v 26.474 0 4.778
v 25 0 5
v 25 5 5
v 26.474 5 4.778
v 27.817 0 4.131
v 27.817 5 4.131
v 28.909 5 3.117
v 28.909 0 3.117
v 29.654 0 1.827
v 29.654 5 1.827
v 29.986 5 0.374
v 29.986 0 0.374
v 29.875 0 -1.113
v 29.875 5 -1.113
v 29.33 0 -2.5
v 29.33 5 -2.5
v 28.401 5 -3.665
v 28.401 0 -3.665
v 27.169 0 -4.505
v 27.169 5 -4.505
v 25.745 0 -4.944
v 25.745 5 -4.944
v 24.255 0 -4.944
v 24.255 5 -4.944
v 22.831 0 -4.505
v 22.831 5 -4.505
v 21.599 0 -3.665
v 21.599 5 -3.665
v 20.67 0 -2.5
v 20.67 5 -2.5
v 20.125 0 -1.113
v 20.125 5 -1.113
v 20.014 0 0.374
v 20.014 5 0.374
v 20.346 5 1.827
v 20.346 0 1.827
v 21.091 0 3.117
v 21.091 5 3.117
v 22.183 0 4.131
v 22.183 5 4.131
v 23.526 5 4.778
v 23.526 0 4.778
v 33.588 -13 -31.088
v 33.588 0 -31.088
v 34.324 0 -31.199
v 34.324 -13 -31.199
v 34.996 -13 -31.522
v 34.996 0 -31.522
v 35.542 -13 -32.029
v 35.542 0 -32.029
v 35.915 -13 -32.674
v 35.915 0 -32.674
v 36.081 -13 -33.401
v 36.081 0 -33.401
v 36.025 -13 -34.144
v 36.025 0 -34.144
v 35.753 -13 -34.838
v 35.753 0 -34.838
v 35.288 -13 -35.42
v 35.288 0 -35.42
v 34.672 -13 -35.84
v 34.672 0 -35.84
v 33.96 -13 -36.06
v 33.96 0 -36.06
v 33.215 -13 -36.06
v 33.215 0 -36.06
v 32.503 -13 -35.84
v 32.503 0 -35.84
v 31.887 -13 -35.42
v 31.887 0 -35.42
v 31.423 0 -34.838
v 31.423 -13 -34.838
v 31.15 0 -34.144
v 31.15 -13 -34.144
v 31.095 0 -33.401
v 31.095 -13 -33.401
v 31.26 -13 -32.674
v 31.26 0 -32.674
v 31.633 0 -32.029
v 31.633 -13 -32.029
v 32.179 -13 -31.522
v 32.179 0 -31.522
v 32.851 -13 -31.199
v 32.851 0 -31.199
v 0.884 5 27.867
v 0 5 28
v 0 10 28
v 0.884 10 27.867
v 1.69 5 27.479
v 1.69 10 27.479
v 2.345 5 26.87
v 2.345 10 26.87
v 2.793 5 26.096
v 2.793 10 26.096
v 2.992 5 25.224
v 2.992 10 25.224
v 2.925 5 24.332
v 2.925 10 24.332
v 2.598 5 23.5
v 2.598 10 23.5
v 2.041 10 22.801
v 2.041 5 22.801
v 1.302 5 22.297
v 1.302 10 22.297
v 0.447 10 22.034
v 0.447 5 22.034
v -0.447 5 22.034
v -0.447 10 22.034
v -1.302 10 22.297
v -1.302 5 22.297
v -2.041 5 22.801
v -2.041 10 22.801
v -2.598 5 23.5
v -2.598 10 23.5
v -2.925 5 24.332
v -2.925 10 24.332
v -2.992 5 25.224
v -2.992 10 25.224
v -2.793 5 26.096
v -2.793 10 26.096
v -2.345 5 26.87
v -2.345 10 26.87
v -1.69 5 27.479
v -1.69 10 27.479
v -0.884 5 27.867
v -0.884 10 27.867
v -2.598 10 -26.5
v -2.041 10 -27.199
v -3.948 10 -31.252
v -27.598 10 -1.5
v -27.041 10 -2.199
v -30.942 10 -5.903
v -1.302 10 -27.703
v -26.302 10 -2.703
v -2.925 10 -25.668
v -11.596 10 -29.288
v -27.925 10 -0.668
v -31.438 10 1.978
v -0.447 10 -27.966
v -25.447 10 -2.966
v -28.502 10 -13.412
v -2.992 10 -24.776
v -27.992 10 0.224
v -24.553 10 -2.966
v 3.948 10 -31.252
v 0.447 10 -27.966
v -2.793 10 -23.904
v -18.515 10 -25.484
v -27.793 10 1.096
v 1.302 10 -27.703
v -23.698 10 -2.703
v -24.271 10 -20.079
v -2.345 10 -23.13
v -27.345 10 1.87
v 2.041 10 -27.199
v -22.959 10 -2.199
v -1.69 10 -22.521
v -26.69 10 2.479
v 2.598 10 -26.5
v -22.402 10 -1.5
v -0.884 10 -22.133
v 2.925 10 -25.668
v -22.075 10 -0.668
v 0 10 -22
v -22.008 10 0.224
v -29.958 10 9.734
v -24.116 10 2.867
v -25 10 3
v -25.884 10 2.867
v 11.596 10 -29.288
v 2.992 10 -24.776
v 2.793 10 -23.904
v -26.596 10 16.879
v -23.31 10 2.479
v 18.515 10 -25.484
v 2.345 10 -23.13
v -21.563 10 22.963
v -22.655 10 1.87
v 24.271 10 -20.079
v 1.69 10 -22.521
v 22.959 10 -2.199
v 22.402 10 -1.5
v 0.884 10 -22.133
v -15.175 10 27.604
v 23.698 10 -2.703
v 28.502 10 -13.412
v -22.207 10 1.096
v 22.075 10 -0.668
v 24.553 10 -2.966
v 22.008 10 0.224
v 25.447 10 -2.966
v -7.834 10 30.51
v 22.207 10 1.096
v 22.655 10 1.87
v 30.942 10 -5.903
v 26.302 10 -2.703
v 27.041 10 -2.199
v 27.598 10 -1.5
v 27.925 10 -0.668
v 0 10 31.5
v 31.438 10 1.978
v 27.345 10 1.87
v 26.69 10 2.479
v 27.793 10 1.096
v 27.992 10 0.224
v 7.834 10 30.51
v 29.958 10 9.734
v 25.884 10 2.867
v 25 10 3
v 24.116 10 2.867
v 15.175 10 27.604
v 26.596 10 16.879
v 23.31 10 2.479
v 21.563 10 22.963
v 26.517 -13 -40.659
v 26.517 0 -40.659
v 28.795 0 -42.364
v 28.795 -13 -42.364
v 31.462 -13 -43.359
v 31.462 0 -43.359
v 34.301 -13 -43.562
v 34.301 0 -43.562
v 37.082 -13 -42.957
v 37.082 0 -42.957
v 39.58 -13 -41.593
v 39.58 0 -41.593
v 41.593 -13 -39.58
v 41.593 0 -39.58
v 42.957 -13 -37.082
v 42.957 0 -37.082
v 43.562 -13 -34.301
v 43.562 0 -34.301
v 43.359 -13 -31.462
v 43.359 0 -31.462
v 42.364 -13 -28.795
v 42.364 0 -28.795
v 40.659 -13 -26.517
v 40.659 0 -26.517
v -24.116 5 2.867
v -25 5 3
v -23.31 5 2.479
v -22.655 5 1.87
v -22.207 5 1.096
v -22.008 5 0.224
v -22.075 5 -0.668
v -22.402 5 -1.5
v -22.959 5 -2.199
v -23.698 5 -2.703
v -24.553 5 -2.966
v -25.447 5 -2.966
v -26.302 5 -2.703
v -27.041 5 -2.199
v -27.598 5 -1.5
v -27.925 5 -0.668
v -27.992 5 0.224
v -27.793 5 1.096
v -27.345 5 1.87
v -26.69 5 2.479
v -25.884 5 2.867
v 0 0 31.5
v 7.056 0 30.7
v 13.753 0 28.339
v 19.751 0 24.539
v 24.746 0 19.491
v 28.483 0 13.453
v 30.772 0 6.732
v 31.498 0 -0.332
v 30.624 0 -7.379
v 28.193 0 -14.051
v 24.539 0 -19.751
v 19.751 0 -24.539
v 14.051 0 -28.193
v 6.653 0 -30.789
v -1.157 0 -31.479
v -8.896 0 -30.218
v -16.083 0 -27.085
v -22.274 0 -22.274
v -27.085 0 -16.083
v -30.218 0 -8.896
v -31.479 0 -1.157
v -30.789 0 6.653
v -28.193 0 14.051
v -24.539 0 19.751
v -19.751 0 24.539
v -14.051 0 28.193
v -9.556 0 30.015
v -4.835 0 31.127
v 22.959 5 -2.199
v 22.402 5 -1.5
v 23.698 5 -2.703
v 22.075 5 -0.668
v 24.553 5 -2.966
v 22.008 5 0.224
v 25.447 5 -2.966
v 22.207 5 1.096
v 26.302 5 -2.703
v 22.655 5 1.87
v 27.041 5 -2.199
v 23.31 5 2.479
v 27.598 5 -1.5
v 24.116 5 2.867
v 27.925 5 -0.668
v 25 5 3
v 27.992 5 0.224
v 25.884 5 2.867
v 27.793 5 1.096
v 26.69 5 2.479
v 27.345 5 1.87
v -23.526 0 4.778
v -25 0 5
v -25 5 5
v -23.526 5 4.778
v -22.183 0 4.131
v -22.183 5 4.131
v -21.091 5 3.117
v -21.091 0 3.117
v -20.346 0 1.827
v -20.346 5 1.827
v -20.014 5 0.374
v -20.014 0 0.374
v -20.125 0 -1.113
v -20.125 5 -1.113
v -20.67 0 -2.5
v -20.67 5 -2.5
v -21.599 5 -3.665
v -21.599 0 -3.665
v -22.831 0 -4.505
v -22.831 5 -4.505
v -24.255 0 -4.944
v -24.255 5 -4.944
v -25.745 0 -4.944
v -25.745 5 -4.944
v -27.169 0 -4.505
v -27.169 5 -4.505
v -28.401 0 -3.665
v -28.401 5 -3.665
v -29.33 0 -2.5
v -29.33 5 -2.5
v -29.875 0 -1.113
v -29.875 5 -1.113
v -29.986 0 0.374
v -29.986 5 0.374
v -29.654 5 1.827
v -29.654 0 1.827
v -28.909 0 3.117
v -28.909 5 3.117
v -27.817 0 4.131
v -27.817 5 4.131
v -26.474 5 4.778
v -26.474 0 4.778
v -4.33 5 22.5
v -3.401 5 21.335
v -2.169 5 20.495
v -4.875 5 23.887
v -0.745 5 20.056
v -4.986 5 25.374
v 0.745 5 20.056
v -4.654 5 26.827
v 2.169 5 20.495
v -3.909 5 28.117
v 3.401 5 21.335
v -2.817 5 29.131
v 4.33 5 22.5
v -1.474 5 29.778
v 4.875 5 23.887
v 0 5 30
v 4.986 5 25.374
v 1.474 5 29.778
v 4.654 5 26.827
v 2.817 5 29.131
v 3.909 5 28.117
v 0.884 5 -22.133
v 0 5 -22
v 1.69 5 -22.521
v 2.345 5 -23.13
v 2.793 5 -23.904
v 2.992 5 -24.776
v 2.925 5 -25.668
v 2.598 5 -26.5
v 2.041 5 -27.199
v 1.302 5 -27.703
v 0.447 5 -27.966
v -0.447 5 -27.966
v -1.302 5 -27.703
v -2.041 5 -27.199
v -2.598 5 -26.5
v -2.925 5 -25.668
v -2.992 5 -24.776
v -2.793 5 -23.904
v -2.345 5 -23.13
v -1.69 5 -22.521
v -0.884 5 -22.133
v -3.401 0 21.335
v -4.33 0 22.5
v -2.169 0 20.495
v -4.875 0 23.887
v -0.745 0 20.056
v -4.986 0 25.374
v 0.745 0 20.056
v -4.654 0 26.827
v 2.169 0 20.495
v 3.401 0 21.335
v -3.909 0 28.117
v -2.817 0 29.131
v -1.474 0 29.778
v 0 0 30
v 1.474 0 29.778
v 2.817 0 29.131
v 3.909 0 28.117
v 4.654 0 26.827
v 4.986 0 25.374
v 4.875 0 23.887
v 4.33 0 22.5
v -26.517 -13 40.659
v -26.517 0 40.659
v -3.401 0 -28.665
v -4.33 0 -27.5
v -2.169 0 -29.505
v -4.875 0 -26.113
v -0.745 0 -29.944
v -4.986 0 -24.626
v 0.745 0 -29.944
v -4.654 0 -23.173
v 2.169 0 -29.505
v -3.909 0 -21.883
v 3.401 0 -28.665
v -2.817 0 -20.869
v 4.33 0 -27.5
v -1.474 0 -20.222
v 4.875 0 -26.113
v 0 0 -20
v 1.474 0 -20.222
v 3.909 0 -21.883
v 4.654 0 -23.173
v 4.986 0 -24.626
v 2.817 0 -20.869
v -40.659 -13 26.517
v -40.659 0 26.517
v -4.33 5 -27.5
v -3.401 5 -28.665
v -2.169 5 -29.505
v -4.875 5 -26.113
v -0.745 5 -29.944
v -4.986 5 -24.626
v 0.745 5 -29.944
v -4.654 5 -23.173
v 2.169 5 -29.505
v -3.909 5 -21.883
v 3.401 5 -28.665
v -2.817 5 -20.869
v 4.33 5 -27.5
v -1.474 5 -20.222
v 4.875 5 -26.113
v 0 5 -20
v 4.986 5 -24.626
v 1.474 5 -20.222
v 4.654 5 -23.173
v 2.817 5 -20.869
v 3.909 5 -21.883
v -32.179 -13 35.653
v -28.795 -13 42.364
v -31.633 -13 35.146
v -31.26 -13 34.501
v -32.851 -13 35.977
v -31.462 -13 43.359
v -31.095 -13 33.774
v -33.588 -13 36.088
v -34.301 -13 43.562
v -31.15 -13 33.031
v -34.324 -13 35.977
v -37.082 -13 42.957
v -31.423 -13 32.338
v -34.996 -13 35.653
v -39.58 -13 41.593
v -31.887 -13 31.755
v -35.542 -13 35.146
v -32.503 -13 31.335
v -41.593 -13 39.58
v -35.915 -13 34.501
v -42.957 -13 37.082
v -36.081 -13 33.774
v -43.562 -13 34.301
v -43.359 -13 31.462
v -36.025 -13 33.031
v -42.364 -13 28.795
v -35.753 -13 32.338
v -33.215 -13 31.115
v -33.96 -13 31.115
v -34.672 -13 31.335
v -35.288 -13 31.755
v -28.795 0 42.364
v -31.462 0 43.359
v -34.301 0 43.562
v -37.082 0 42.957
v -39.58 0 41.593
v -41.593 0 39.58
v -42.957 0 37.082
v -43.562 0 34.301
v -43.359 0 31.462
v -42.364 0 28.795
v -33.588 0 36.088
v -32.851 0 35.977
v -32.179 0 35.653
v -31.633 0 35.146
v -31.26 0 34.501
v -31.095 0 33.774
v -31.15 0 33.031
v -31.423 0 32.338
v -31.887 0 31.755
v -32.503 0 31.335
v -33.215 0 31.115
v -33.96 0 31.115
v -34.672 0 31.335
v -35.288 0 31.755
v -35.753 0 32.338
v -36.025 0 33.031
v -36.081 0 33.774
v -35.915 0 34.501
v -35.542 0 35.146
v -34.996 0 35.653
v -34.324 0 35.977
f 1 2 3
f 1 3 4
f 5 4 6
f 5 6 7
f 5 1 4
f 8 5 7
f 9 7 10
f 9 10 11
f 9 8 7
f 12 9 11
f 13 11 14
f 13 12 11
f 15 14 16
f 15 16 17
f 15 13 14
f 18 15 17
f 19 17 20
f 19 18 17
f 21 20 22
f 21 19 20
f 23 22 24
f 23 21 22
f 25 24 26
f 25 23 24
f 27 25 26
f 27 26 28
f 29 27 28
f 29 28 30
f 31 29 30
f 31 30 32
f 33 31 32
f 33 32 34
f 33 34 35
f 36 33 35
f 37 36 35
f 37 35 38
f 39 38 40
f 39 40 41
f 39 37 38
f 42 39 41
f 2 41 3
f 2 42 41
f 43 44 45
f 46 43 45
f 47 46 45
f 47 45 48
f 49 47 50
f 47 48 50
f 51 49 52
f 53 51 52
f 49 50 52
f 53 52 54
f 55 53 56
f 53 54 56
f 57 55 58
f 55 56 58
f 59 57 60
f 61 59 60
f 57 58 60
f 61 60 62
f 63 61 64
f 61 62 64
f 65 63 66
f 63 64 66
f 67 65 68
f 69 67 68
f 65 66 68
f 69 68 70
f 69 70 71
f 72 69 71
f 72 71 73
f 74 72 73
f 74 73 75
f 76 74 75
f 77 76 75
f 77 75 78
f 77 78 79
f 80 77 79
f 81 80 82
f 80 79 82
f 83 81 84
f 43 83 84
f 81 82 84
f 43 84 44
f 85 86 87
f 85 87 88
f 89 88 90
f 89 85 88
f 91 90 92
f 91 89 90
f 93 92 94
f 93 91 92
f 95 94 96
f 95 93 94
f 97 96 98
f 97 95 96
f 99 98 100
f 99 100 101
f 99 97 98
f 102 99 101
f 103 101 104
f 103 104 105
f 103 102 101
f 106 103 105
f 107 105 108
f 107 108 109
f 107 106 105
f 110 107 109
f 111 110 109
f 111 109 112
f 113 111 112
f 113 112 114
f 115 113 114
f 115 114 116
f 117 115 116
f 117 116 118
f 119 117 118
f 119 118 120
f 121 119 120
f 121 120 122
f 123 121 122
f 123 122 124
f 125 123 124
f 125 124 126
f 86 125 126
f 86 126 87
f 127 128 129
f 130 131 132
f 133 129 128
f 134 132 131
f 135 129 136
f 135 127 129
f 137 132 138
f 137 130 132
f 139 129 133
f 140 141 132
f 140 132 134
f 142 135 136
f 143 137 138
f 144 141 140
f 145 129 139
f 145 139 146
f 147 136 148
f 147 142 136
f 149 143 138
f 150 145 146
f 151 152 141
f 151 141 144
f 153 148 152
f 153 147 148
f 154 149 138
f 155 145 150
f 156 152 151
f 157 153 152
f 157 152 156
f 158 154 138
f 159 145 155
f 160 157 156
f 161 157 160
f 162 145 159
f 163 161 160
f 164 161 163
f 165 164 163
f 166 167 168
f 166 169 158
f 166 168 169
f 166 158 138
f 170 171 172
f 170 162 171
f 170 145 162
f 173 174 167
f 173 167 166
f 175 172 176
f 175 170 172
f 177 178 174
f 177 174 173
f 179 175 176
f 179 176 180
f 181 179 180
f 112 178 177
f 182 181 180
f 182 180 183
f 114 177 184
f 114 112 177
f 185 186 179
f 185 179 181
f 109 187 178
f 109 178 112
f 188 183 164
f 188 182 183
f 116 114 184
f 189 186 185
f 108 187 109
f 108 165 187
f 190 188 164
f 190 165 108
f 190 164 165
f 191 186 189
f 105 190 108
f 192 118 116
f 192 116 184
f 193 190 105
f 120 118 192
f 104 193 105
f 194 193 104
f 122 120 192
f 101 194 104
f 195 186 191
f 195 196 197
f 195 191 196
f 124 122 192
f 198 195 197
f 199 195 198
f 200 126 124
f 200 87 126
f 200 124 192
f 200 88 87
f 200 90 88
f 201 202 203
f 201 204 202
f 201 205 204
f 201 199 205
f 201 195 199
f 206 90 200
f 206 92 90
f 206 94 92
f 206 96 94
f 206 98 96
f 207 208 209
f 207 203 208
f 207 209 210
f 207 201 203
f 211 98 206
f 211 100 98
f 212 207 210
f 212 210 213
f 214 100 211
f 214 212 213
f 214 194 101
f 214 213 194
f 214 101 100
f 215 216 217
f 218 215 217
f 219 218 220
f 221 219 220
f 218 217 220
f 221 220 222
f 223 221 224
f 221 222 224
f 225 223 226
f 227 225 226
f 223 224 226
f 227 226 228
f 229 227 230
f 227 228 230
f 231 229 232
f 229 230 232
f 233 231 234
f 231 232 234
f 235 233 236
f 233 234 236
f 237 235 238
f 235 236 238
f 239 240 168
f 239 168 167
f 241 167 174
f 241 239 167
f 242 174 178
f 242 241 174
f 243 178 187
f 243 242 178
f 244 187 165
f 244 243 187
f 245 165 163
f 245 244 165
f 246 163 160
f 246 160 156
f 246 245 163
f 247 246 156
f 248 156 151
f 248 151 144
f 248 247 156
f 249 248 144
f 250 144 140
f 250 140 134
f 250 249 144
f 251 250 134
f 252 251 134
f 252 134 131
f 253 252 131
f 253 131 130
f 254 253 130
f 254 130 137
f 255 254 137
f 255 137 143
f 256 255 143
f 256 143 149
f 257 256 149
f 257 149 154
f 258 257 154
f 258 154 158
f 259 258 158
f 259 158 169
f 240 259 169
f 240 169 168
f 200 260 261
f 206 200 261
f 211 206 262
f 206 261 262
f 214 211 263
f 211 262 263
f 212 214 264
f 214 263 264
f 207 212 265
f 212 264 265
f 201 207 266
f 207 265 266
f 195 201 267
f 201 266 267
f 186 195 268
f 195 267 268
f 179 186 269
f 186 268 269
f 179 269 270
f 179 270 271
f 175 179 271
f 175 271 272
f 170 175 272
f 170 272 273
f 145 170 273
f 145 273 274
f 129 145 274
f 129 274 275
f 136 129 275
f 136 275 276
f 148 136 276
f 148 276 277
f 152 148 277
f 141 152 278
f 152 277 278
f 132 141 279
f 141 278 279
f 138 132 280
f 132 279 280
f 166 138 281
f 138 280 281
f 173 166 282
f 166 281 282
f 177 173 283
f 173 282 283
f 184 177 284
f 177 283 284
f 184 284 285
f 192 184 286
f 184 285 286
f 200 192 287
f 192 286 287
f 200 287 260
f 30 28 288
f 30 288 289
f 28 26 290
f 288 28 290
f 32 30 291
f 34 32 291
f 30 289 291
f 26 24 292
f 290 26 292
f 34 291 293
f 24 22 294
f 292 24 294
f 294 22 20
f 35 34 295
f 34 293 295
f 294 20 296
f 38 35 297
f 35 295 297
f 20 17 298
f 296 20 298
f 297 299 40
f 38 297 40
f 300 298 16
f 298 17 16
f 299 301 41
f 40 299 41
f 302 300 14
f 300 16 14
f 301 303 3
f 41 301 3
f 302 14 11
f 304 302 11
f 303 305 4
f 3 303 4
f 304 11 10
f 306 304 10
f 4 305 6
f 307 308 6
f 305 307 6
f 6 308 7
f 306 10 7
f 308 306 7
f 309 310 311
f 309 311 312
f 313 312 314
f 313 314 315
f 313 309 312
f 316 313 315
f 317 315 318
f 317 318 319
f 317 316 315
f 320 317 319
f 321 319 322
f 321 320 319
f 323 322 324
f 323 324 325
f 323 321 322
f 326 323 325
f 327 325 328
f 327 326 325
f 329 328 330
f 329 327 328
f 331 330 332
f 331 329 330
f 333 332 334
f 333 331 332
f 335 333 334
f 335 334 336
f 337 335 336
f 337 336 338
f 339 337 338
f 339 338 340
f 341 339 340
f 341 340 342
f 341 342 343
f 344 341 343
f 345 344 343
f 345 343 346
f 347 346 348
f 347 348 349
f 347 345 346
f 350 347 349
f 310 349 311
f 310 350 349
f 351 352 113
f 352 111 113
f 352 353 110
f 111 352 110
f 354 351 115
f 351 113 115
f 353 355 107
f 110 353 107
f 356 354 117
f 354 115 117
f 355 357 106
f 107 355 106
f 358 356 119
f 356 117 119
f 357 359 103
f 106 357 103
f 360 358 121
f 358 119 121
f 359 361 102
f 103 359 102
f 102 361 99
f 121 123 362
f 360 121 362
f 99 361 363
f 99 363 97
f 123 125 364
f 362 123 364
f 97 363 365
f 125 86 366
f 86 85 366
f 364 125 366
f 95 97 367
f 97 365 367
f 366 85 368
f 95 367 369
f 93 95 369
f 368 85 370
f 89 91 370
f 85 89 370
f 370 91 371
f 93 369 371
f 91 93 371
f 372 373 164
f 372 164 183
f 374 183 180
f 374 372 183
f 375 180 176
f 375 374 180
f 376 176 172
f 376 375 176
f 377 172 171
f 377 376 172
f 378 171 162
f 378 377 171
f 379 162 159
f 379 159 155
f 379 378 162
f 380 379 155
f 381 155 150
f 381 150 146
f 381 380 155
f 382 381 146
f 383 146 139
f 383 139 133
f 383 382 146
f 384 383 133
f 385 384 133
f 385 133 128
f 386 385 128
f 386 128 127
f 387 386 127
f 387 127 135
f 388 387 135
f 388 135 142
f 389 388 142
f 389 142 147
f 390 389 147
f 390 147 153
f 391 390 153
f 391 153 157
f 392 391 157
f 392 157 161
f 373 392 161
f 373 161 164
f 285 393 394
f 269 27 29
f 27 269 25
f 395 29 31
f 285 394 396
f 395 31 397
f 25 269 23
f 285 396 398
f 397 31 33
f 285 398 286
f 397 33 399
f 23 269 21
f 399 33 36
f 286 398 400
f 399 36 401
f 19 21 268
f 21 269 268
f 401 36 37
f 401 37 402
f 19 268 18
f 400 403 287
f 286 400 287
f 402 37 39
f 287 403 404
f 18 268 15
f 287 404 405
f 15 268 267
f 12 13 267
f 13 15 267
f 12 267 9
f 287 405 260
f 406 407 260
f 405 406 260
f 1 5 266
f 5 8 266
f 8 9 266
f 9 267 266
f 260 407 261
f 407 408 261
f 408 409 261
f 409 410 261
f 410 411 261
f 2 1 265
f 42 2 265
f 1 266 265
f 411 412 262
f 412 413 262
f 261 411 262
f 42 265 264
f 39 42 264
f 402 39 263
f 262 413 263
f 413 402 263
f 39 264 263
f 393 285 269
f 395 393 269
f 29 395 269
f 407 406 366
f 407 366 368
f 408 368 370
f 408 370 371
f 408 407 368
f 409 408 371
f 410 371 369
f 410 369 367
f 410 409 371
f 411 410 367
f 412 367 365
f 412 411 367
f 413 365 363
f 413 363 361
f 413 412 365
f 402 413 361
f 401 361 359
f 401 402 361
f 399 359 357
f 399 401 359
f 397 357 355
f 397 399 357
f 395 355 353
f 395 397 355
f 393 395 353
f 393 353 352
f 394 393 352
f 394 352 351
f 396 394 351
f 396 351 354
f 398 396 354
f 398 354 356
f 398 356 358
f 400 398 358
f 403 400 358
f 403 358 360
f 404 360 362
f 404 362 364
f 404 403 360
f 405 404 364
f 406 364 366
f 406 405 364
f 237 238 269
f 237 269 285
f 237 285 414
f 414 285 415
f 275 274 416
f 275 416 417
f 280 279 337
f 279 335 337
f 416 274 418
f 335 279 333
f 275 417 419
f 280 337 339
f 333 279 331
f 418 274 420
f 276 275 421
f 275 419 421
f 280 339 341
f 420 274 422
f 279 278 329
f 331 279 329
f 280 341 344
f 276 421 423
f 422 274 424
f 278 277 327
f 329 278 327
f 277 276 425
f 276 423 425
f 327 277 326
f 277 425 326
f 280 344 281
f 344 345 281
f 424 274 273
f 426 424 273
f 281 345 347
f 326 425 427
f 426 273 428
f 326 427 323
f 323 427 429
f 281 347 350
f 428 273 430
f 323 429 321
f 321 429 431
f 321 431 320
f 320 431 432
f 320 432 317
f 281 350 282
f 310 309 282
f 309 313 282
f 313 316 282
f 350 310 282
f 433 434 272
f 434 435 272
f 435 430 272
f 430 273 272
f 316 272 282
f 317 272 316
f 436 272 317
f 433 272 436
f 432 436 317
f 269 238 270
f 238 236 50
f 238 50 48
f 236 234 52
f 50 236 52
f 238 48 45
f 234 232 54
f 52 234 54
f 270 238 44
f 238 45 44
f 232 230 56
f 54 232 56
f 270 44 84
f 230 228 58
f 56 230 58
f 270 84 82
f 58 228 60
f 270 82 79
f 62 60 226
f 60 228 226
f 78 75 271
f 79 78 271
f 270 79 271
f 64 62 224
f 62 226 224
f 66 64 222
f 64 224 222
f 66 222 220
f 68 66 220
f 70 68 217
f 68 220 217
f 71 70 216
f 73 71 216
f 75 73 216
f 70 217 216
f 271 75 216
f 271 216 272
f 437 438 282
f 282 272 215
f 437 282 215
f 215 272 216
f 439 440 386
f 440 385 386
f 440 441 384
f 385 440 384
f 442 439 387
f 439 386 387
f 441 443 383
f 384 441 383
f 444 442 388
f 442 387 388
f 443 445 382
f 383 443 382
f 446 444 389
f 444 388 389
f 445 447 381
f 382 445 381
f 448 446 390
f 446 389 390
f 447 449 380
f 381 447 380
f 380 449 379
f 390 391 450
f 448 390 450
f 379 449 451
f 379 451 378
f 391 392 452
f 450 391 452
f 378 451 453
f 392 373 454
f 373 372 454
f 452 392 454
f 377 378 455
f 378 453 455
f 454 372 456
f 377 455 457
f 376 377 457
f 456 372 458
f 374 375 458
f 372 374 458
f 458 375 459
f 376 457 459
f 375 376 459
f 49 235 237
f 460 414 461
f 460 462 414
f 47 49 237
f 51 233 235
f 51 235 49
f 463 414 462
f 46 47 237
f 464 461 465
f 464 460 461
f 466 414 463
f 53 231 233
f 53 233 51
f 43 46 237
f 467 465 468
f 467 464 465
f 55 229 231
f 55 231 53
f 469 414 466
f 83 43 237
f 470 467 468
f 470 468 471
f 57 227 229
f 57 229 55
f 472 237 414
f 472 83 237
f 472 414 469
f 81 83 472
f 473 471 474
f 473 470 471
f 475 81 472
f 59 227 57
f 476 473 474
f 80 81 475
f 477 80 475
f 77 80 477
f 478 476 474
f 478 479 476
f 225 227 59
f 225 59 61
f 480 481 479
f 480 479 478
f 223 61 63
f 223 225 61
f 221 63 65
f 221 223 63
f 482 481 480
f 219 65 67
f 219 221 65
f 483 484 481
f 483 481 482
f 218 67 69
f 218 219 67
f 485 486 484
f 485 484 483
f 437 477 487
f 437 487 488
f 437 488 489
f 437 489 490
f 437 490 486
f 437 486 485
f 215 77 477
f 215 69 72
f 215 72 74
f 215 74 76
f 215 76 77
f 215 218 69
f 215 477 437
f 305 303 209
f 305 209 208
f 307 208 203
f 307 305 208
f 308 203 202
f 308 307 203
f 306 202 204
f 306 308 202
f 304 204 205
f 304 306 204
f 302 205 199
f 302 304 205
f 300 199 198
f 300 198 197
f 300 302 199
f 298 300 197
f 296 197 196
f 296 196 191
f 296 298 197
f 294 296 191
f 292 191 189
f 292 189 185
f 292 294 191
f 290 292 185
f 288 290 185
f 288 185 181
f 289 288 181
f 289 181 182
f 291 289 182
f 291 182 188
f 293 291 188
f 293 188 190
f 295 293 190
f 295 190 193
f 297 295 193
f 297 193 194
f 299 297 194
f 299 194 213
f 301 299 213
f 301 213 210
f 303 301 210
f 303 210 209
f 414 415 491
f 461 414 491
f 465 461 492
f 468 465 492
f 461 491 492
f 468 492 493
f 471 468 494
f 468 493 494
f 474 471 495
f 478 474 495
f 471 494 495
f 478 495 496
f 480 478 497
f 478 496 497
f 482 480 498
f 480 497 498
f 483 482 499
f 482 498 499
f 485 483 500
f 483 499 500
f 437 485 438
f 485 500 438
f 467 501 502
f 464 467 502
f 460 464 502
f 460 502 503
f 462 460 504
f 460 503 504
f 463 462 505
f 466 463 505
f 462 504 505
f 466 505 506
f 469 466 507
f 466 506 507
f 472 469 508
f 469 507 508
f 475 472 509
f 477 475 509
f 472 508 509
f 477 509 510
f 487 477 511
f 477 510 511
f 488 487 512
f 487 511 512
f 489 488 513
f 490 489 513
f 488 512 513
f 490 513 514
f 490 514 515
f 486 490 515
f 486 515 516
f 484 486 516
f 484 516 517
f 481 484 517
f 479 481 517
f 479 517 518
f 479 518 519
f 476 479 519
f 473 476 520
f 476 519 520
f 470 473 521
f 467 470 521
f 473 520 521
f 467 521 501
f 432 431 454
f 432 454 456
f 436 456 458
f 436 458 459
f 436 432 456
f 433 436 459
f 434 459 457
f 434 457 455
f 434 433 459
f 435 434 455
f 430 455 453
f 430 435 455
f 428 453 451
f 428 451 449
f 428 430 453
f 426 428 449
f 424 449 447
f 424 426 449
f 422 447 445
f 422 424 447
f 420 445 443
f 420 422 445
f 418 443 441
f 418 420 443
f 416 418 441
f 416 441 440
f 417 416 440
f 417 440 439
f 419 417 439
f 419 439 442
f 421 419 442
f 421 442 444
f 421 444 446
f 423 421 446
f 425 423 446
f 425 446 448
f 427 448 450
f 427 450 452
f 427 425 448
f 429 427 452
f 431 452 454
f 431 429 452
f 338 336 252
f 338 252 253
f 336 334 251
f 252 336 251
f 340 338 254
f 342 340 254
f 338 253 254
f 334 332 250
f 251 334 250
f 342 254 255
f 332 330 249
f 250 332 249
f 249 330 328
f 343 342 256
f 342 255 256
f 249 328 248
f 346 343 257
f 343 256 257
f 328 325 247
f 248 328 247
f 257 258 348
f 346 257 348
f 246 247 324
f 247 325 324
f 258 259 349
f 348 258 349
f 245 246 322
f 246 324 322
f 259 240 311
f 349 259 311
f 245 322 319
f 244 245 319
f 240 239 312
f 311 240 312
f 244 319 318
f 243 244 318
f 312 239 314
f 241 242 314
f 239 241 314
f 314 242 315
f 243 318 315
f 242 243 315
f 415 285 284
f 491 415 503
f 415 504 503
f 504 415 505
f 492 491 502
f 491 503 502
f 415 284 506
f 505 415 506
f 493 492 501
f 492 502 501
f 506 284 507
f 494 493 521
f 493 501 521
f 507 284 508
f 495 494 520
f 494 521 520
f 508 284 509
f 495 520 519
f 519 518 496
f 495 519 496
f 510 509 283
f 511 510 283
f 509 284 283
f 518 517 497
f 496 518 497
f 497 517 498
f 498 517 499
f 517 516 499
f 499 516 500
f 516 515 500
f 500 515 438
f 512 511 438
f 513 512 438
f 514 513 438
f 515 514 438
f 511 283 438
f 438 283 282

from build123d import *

# Parameters (mm, degrees)
SKETCH1_R           = 31.5
BOSS_EXTRUDE4_DEPTH = 10
SKETCH3_R           = 3
CUT_EXTRUDE2_DEPTH  = 10
SKETCH4_R           = 5
CUT_EXTRUDE3_DEPTH  = 5
SKETCH5_R           = 2.5
BOSS_EXTRUDE5_DEPTH = 13


with BuildPart() as part:
    # Sketch1 → Boss-Extrude4 (new body)
    with BuildSketch(Plane(origin=(0, 0, 0), x_dir=(1, 0, 0), z_dir=(0, 1, 0))):
        with Locations(Location((0, 0, 0), (0, 0, 270))):
            Circle(SKETCH1_R)
    extrude(amount=BOSS_EXTRUDE4_DEPTH)

    # Sketch3 → Cut-Extrude2 (cut)
    with BuildSketch(Plane(origin=(0, 0, 0), x_dir=(1, 0, 0), z_dir=(0, 1, 0))):
        with Locations(Location((0, 25, 0), (0, 0, 270))):
            Circle(SKETCH3_R)
        with Locations(Location((25, 0, 0), (0, 0, 270))):
            Circle(SKETCH3_R)
        with Locations(Location((0, -25, 0), (0, 0, 270))):
            Circle(SKETCH3_R)
        with Locations(Location((-25, 0, 0), (0, 0, 270))):
            Circle(SKETCH3_R)
    extrude(amount=CUT_EXTRUDE2_DEPTH, mode=Mode.SUBTRACT)

    # Sketch4 → Cut-Extrude3 (cut)
    with BuildSketch(Plane(origin=(0, 0, 0), x_dir=(1, 0, 0), z_dir=(0, 1, 0))):
        with Locations(Location((0, 25, 0), (0, 0, 270))):
            Circle(SKETCH4_R)
        with Locations(Location((25, 0, 0), (0, 0, 270))):
            Circle(SKETCH4_R)
        with Locations(Location((0, -25, 0), (0, 0, 270))):
            Circle(SKETCH4_R)
        with Locations(Location((-25, 0, 0), (0, 0, 270))):
            Circle(SKETCH4_R)
    extrude(amount=CUT_EXTRUDE3_DEPTH, mode=Mode.SUBTRACT)

    # Sketch5 → Boss-Extrude5 (add)
    with BuildSketch(Plane(origin=(0, 0, 0), x_dir=(1, 0, 0), z_dir=(0, 1, 0))):
        with BuildLine():
            Line((-40.658639918, -26.516504294), (26.516504294, 40.658639918))
            ThreePointArc((26.516504294, 40.658639918), (40.658639918, 40.658639918), (40.658639918, 26.516504294))
            Line((40.658639918, 26.516504294), (-26.516504294, -40.658639918))
            ThreePointArc((-26.516504294, -40.658639918), (-40.658639918, -40.658639918), (-40.658639918, -26.516504294))
        make_face()
        with Locations(Location((-33.587572106, -33.587572106, 0), (0, 0, 270))):
            Circle(SKETCH5_R, mode=Mode.SUBTRACT)
        with Locations(Location((33.587572106, 33.587572106, 0), (0, 0, 270))):
            Circle(SKETCH5_R, mode=Mode.SUBTRACT)
    extrude(amount=-BOSS_EXTRUDE5_DEPTH)


solid = part.part
